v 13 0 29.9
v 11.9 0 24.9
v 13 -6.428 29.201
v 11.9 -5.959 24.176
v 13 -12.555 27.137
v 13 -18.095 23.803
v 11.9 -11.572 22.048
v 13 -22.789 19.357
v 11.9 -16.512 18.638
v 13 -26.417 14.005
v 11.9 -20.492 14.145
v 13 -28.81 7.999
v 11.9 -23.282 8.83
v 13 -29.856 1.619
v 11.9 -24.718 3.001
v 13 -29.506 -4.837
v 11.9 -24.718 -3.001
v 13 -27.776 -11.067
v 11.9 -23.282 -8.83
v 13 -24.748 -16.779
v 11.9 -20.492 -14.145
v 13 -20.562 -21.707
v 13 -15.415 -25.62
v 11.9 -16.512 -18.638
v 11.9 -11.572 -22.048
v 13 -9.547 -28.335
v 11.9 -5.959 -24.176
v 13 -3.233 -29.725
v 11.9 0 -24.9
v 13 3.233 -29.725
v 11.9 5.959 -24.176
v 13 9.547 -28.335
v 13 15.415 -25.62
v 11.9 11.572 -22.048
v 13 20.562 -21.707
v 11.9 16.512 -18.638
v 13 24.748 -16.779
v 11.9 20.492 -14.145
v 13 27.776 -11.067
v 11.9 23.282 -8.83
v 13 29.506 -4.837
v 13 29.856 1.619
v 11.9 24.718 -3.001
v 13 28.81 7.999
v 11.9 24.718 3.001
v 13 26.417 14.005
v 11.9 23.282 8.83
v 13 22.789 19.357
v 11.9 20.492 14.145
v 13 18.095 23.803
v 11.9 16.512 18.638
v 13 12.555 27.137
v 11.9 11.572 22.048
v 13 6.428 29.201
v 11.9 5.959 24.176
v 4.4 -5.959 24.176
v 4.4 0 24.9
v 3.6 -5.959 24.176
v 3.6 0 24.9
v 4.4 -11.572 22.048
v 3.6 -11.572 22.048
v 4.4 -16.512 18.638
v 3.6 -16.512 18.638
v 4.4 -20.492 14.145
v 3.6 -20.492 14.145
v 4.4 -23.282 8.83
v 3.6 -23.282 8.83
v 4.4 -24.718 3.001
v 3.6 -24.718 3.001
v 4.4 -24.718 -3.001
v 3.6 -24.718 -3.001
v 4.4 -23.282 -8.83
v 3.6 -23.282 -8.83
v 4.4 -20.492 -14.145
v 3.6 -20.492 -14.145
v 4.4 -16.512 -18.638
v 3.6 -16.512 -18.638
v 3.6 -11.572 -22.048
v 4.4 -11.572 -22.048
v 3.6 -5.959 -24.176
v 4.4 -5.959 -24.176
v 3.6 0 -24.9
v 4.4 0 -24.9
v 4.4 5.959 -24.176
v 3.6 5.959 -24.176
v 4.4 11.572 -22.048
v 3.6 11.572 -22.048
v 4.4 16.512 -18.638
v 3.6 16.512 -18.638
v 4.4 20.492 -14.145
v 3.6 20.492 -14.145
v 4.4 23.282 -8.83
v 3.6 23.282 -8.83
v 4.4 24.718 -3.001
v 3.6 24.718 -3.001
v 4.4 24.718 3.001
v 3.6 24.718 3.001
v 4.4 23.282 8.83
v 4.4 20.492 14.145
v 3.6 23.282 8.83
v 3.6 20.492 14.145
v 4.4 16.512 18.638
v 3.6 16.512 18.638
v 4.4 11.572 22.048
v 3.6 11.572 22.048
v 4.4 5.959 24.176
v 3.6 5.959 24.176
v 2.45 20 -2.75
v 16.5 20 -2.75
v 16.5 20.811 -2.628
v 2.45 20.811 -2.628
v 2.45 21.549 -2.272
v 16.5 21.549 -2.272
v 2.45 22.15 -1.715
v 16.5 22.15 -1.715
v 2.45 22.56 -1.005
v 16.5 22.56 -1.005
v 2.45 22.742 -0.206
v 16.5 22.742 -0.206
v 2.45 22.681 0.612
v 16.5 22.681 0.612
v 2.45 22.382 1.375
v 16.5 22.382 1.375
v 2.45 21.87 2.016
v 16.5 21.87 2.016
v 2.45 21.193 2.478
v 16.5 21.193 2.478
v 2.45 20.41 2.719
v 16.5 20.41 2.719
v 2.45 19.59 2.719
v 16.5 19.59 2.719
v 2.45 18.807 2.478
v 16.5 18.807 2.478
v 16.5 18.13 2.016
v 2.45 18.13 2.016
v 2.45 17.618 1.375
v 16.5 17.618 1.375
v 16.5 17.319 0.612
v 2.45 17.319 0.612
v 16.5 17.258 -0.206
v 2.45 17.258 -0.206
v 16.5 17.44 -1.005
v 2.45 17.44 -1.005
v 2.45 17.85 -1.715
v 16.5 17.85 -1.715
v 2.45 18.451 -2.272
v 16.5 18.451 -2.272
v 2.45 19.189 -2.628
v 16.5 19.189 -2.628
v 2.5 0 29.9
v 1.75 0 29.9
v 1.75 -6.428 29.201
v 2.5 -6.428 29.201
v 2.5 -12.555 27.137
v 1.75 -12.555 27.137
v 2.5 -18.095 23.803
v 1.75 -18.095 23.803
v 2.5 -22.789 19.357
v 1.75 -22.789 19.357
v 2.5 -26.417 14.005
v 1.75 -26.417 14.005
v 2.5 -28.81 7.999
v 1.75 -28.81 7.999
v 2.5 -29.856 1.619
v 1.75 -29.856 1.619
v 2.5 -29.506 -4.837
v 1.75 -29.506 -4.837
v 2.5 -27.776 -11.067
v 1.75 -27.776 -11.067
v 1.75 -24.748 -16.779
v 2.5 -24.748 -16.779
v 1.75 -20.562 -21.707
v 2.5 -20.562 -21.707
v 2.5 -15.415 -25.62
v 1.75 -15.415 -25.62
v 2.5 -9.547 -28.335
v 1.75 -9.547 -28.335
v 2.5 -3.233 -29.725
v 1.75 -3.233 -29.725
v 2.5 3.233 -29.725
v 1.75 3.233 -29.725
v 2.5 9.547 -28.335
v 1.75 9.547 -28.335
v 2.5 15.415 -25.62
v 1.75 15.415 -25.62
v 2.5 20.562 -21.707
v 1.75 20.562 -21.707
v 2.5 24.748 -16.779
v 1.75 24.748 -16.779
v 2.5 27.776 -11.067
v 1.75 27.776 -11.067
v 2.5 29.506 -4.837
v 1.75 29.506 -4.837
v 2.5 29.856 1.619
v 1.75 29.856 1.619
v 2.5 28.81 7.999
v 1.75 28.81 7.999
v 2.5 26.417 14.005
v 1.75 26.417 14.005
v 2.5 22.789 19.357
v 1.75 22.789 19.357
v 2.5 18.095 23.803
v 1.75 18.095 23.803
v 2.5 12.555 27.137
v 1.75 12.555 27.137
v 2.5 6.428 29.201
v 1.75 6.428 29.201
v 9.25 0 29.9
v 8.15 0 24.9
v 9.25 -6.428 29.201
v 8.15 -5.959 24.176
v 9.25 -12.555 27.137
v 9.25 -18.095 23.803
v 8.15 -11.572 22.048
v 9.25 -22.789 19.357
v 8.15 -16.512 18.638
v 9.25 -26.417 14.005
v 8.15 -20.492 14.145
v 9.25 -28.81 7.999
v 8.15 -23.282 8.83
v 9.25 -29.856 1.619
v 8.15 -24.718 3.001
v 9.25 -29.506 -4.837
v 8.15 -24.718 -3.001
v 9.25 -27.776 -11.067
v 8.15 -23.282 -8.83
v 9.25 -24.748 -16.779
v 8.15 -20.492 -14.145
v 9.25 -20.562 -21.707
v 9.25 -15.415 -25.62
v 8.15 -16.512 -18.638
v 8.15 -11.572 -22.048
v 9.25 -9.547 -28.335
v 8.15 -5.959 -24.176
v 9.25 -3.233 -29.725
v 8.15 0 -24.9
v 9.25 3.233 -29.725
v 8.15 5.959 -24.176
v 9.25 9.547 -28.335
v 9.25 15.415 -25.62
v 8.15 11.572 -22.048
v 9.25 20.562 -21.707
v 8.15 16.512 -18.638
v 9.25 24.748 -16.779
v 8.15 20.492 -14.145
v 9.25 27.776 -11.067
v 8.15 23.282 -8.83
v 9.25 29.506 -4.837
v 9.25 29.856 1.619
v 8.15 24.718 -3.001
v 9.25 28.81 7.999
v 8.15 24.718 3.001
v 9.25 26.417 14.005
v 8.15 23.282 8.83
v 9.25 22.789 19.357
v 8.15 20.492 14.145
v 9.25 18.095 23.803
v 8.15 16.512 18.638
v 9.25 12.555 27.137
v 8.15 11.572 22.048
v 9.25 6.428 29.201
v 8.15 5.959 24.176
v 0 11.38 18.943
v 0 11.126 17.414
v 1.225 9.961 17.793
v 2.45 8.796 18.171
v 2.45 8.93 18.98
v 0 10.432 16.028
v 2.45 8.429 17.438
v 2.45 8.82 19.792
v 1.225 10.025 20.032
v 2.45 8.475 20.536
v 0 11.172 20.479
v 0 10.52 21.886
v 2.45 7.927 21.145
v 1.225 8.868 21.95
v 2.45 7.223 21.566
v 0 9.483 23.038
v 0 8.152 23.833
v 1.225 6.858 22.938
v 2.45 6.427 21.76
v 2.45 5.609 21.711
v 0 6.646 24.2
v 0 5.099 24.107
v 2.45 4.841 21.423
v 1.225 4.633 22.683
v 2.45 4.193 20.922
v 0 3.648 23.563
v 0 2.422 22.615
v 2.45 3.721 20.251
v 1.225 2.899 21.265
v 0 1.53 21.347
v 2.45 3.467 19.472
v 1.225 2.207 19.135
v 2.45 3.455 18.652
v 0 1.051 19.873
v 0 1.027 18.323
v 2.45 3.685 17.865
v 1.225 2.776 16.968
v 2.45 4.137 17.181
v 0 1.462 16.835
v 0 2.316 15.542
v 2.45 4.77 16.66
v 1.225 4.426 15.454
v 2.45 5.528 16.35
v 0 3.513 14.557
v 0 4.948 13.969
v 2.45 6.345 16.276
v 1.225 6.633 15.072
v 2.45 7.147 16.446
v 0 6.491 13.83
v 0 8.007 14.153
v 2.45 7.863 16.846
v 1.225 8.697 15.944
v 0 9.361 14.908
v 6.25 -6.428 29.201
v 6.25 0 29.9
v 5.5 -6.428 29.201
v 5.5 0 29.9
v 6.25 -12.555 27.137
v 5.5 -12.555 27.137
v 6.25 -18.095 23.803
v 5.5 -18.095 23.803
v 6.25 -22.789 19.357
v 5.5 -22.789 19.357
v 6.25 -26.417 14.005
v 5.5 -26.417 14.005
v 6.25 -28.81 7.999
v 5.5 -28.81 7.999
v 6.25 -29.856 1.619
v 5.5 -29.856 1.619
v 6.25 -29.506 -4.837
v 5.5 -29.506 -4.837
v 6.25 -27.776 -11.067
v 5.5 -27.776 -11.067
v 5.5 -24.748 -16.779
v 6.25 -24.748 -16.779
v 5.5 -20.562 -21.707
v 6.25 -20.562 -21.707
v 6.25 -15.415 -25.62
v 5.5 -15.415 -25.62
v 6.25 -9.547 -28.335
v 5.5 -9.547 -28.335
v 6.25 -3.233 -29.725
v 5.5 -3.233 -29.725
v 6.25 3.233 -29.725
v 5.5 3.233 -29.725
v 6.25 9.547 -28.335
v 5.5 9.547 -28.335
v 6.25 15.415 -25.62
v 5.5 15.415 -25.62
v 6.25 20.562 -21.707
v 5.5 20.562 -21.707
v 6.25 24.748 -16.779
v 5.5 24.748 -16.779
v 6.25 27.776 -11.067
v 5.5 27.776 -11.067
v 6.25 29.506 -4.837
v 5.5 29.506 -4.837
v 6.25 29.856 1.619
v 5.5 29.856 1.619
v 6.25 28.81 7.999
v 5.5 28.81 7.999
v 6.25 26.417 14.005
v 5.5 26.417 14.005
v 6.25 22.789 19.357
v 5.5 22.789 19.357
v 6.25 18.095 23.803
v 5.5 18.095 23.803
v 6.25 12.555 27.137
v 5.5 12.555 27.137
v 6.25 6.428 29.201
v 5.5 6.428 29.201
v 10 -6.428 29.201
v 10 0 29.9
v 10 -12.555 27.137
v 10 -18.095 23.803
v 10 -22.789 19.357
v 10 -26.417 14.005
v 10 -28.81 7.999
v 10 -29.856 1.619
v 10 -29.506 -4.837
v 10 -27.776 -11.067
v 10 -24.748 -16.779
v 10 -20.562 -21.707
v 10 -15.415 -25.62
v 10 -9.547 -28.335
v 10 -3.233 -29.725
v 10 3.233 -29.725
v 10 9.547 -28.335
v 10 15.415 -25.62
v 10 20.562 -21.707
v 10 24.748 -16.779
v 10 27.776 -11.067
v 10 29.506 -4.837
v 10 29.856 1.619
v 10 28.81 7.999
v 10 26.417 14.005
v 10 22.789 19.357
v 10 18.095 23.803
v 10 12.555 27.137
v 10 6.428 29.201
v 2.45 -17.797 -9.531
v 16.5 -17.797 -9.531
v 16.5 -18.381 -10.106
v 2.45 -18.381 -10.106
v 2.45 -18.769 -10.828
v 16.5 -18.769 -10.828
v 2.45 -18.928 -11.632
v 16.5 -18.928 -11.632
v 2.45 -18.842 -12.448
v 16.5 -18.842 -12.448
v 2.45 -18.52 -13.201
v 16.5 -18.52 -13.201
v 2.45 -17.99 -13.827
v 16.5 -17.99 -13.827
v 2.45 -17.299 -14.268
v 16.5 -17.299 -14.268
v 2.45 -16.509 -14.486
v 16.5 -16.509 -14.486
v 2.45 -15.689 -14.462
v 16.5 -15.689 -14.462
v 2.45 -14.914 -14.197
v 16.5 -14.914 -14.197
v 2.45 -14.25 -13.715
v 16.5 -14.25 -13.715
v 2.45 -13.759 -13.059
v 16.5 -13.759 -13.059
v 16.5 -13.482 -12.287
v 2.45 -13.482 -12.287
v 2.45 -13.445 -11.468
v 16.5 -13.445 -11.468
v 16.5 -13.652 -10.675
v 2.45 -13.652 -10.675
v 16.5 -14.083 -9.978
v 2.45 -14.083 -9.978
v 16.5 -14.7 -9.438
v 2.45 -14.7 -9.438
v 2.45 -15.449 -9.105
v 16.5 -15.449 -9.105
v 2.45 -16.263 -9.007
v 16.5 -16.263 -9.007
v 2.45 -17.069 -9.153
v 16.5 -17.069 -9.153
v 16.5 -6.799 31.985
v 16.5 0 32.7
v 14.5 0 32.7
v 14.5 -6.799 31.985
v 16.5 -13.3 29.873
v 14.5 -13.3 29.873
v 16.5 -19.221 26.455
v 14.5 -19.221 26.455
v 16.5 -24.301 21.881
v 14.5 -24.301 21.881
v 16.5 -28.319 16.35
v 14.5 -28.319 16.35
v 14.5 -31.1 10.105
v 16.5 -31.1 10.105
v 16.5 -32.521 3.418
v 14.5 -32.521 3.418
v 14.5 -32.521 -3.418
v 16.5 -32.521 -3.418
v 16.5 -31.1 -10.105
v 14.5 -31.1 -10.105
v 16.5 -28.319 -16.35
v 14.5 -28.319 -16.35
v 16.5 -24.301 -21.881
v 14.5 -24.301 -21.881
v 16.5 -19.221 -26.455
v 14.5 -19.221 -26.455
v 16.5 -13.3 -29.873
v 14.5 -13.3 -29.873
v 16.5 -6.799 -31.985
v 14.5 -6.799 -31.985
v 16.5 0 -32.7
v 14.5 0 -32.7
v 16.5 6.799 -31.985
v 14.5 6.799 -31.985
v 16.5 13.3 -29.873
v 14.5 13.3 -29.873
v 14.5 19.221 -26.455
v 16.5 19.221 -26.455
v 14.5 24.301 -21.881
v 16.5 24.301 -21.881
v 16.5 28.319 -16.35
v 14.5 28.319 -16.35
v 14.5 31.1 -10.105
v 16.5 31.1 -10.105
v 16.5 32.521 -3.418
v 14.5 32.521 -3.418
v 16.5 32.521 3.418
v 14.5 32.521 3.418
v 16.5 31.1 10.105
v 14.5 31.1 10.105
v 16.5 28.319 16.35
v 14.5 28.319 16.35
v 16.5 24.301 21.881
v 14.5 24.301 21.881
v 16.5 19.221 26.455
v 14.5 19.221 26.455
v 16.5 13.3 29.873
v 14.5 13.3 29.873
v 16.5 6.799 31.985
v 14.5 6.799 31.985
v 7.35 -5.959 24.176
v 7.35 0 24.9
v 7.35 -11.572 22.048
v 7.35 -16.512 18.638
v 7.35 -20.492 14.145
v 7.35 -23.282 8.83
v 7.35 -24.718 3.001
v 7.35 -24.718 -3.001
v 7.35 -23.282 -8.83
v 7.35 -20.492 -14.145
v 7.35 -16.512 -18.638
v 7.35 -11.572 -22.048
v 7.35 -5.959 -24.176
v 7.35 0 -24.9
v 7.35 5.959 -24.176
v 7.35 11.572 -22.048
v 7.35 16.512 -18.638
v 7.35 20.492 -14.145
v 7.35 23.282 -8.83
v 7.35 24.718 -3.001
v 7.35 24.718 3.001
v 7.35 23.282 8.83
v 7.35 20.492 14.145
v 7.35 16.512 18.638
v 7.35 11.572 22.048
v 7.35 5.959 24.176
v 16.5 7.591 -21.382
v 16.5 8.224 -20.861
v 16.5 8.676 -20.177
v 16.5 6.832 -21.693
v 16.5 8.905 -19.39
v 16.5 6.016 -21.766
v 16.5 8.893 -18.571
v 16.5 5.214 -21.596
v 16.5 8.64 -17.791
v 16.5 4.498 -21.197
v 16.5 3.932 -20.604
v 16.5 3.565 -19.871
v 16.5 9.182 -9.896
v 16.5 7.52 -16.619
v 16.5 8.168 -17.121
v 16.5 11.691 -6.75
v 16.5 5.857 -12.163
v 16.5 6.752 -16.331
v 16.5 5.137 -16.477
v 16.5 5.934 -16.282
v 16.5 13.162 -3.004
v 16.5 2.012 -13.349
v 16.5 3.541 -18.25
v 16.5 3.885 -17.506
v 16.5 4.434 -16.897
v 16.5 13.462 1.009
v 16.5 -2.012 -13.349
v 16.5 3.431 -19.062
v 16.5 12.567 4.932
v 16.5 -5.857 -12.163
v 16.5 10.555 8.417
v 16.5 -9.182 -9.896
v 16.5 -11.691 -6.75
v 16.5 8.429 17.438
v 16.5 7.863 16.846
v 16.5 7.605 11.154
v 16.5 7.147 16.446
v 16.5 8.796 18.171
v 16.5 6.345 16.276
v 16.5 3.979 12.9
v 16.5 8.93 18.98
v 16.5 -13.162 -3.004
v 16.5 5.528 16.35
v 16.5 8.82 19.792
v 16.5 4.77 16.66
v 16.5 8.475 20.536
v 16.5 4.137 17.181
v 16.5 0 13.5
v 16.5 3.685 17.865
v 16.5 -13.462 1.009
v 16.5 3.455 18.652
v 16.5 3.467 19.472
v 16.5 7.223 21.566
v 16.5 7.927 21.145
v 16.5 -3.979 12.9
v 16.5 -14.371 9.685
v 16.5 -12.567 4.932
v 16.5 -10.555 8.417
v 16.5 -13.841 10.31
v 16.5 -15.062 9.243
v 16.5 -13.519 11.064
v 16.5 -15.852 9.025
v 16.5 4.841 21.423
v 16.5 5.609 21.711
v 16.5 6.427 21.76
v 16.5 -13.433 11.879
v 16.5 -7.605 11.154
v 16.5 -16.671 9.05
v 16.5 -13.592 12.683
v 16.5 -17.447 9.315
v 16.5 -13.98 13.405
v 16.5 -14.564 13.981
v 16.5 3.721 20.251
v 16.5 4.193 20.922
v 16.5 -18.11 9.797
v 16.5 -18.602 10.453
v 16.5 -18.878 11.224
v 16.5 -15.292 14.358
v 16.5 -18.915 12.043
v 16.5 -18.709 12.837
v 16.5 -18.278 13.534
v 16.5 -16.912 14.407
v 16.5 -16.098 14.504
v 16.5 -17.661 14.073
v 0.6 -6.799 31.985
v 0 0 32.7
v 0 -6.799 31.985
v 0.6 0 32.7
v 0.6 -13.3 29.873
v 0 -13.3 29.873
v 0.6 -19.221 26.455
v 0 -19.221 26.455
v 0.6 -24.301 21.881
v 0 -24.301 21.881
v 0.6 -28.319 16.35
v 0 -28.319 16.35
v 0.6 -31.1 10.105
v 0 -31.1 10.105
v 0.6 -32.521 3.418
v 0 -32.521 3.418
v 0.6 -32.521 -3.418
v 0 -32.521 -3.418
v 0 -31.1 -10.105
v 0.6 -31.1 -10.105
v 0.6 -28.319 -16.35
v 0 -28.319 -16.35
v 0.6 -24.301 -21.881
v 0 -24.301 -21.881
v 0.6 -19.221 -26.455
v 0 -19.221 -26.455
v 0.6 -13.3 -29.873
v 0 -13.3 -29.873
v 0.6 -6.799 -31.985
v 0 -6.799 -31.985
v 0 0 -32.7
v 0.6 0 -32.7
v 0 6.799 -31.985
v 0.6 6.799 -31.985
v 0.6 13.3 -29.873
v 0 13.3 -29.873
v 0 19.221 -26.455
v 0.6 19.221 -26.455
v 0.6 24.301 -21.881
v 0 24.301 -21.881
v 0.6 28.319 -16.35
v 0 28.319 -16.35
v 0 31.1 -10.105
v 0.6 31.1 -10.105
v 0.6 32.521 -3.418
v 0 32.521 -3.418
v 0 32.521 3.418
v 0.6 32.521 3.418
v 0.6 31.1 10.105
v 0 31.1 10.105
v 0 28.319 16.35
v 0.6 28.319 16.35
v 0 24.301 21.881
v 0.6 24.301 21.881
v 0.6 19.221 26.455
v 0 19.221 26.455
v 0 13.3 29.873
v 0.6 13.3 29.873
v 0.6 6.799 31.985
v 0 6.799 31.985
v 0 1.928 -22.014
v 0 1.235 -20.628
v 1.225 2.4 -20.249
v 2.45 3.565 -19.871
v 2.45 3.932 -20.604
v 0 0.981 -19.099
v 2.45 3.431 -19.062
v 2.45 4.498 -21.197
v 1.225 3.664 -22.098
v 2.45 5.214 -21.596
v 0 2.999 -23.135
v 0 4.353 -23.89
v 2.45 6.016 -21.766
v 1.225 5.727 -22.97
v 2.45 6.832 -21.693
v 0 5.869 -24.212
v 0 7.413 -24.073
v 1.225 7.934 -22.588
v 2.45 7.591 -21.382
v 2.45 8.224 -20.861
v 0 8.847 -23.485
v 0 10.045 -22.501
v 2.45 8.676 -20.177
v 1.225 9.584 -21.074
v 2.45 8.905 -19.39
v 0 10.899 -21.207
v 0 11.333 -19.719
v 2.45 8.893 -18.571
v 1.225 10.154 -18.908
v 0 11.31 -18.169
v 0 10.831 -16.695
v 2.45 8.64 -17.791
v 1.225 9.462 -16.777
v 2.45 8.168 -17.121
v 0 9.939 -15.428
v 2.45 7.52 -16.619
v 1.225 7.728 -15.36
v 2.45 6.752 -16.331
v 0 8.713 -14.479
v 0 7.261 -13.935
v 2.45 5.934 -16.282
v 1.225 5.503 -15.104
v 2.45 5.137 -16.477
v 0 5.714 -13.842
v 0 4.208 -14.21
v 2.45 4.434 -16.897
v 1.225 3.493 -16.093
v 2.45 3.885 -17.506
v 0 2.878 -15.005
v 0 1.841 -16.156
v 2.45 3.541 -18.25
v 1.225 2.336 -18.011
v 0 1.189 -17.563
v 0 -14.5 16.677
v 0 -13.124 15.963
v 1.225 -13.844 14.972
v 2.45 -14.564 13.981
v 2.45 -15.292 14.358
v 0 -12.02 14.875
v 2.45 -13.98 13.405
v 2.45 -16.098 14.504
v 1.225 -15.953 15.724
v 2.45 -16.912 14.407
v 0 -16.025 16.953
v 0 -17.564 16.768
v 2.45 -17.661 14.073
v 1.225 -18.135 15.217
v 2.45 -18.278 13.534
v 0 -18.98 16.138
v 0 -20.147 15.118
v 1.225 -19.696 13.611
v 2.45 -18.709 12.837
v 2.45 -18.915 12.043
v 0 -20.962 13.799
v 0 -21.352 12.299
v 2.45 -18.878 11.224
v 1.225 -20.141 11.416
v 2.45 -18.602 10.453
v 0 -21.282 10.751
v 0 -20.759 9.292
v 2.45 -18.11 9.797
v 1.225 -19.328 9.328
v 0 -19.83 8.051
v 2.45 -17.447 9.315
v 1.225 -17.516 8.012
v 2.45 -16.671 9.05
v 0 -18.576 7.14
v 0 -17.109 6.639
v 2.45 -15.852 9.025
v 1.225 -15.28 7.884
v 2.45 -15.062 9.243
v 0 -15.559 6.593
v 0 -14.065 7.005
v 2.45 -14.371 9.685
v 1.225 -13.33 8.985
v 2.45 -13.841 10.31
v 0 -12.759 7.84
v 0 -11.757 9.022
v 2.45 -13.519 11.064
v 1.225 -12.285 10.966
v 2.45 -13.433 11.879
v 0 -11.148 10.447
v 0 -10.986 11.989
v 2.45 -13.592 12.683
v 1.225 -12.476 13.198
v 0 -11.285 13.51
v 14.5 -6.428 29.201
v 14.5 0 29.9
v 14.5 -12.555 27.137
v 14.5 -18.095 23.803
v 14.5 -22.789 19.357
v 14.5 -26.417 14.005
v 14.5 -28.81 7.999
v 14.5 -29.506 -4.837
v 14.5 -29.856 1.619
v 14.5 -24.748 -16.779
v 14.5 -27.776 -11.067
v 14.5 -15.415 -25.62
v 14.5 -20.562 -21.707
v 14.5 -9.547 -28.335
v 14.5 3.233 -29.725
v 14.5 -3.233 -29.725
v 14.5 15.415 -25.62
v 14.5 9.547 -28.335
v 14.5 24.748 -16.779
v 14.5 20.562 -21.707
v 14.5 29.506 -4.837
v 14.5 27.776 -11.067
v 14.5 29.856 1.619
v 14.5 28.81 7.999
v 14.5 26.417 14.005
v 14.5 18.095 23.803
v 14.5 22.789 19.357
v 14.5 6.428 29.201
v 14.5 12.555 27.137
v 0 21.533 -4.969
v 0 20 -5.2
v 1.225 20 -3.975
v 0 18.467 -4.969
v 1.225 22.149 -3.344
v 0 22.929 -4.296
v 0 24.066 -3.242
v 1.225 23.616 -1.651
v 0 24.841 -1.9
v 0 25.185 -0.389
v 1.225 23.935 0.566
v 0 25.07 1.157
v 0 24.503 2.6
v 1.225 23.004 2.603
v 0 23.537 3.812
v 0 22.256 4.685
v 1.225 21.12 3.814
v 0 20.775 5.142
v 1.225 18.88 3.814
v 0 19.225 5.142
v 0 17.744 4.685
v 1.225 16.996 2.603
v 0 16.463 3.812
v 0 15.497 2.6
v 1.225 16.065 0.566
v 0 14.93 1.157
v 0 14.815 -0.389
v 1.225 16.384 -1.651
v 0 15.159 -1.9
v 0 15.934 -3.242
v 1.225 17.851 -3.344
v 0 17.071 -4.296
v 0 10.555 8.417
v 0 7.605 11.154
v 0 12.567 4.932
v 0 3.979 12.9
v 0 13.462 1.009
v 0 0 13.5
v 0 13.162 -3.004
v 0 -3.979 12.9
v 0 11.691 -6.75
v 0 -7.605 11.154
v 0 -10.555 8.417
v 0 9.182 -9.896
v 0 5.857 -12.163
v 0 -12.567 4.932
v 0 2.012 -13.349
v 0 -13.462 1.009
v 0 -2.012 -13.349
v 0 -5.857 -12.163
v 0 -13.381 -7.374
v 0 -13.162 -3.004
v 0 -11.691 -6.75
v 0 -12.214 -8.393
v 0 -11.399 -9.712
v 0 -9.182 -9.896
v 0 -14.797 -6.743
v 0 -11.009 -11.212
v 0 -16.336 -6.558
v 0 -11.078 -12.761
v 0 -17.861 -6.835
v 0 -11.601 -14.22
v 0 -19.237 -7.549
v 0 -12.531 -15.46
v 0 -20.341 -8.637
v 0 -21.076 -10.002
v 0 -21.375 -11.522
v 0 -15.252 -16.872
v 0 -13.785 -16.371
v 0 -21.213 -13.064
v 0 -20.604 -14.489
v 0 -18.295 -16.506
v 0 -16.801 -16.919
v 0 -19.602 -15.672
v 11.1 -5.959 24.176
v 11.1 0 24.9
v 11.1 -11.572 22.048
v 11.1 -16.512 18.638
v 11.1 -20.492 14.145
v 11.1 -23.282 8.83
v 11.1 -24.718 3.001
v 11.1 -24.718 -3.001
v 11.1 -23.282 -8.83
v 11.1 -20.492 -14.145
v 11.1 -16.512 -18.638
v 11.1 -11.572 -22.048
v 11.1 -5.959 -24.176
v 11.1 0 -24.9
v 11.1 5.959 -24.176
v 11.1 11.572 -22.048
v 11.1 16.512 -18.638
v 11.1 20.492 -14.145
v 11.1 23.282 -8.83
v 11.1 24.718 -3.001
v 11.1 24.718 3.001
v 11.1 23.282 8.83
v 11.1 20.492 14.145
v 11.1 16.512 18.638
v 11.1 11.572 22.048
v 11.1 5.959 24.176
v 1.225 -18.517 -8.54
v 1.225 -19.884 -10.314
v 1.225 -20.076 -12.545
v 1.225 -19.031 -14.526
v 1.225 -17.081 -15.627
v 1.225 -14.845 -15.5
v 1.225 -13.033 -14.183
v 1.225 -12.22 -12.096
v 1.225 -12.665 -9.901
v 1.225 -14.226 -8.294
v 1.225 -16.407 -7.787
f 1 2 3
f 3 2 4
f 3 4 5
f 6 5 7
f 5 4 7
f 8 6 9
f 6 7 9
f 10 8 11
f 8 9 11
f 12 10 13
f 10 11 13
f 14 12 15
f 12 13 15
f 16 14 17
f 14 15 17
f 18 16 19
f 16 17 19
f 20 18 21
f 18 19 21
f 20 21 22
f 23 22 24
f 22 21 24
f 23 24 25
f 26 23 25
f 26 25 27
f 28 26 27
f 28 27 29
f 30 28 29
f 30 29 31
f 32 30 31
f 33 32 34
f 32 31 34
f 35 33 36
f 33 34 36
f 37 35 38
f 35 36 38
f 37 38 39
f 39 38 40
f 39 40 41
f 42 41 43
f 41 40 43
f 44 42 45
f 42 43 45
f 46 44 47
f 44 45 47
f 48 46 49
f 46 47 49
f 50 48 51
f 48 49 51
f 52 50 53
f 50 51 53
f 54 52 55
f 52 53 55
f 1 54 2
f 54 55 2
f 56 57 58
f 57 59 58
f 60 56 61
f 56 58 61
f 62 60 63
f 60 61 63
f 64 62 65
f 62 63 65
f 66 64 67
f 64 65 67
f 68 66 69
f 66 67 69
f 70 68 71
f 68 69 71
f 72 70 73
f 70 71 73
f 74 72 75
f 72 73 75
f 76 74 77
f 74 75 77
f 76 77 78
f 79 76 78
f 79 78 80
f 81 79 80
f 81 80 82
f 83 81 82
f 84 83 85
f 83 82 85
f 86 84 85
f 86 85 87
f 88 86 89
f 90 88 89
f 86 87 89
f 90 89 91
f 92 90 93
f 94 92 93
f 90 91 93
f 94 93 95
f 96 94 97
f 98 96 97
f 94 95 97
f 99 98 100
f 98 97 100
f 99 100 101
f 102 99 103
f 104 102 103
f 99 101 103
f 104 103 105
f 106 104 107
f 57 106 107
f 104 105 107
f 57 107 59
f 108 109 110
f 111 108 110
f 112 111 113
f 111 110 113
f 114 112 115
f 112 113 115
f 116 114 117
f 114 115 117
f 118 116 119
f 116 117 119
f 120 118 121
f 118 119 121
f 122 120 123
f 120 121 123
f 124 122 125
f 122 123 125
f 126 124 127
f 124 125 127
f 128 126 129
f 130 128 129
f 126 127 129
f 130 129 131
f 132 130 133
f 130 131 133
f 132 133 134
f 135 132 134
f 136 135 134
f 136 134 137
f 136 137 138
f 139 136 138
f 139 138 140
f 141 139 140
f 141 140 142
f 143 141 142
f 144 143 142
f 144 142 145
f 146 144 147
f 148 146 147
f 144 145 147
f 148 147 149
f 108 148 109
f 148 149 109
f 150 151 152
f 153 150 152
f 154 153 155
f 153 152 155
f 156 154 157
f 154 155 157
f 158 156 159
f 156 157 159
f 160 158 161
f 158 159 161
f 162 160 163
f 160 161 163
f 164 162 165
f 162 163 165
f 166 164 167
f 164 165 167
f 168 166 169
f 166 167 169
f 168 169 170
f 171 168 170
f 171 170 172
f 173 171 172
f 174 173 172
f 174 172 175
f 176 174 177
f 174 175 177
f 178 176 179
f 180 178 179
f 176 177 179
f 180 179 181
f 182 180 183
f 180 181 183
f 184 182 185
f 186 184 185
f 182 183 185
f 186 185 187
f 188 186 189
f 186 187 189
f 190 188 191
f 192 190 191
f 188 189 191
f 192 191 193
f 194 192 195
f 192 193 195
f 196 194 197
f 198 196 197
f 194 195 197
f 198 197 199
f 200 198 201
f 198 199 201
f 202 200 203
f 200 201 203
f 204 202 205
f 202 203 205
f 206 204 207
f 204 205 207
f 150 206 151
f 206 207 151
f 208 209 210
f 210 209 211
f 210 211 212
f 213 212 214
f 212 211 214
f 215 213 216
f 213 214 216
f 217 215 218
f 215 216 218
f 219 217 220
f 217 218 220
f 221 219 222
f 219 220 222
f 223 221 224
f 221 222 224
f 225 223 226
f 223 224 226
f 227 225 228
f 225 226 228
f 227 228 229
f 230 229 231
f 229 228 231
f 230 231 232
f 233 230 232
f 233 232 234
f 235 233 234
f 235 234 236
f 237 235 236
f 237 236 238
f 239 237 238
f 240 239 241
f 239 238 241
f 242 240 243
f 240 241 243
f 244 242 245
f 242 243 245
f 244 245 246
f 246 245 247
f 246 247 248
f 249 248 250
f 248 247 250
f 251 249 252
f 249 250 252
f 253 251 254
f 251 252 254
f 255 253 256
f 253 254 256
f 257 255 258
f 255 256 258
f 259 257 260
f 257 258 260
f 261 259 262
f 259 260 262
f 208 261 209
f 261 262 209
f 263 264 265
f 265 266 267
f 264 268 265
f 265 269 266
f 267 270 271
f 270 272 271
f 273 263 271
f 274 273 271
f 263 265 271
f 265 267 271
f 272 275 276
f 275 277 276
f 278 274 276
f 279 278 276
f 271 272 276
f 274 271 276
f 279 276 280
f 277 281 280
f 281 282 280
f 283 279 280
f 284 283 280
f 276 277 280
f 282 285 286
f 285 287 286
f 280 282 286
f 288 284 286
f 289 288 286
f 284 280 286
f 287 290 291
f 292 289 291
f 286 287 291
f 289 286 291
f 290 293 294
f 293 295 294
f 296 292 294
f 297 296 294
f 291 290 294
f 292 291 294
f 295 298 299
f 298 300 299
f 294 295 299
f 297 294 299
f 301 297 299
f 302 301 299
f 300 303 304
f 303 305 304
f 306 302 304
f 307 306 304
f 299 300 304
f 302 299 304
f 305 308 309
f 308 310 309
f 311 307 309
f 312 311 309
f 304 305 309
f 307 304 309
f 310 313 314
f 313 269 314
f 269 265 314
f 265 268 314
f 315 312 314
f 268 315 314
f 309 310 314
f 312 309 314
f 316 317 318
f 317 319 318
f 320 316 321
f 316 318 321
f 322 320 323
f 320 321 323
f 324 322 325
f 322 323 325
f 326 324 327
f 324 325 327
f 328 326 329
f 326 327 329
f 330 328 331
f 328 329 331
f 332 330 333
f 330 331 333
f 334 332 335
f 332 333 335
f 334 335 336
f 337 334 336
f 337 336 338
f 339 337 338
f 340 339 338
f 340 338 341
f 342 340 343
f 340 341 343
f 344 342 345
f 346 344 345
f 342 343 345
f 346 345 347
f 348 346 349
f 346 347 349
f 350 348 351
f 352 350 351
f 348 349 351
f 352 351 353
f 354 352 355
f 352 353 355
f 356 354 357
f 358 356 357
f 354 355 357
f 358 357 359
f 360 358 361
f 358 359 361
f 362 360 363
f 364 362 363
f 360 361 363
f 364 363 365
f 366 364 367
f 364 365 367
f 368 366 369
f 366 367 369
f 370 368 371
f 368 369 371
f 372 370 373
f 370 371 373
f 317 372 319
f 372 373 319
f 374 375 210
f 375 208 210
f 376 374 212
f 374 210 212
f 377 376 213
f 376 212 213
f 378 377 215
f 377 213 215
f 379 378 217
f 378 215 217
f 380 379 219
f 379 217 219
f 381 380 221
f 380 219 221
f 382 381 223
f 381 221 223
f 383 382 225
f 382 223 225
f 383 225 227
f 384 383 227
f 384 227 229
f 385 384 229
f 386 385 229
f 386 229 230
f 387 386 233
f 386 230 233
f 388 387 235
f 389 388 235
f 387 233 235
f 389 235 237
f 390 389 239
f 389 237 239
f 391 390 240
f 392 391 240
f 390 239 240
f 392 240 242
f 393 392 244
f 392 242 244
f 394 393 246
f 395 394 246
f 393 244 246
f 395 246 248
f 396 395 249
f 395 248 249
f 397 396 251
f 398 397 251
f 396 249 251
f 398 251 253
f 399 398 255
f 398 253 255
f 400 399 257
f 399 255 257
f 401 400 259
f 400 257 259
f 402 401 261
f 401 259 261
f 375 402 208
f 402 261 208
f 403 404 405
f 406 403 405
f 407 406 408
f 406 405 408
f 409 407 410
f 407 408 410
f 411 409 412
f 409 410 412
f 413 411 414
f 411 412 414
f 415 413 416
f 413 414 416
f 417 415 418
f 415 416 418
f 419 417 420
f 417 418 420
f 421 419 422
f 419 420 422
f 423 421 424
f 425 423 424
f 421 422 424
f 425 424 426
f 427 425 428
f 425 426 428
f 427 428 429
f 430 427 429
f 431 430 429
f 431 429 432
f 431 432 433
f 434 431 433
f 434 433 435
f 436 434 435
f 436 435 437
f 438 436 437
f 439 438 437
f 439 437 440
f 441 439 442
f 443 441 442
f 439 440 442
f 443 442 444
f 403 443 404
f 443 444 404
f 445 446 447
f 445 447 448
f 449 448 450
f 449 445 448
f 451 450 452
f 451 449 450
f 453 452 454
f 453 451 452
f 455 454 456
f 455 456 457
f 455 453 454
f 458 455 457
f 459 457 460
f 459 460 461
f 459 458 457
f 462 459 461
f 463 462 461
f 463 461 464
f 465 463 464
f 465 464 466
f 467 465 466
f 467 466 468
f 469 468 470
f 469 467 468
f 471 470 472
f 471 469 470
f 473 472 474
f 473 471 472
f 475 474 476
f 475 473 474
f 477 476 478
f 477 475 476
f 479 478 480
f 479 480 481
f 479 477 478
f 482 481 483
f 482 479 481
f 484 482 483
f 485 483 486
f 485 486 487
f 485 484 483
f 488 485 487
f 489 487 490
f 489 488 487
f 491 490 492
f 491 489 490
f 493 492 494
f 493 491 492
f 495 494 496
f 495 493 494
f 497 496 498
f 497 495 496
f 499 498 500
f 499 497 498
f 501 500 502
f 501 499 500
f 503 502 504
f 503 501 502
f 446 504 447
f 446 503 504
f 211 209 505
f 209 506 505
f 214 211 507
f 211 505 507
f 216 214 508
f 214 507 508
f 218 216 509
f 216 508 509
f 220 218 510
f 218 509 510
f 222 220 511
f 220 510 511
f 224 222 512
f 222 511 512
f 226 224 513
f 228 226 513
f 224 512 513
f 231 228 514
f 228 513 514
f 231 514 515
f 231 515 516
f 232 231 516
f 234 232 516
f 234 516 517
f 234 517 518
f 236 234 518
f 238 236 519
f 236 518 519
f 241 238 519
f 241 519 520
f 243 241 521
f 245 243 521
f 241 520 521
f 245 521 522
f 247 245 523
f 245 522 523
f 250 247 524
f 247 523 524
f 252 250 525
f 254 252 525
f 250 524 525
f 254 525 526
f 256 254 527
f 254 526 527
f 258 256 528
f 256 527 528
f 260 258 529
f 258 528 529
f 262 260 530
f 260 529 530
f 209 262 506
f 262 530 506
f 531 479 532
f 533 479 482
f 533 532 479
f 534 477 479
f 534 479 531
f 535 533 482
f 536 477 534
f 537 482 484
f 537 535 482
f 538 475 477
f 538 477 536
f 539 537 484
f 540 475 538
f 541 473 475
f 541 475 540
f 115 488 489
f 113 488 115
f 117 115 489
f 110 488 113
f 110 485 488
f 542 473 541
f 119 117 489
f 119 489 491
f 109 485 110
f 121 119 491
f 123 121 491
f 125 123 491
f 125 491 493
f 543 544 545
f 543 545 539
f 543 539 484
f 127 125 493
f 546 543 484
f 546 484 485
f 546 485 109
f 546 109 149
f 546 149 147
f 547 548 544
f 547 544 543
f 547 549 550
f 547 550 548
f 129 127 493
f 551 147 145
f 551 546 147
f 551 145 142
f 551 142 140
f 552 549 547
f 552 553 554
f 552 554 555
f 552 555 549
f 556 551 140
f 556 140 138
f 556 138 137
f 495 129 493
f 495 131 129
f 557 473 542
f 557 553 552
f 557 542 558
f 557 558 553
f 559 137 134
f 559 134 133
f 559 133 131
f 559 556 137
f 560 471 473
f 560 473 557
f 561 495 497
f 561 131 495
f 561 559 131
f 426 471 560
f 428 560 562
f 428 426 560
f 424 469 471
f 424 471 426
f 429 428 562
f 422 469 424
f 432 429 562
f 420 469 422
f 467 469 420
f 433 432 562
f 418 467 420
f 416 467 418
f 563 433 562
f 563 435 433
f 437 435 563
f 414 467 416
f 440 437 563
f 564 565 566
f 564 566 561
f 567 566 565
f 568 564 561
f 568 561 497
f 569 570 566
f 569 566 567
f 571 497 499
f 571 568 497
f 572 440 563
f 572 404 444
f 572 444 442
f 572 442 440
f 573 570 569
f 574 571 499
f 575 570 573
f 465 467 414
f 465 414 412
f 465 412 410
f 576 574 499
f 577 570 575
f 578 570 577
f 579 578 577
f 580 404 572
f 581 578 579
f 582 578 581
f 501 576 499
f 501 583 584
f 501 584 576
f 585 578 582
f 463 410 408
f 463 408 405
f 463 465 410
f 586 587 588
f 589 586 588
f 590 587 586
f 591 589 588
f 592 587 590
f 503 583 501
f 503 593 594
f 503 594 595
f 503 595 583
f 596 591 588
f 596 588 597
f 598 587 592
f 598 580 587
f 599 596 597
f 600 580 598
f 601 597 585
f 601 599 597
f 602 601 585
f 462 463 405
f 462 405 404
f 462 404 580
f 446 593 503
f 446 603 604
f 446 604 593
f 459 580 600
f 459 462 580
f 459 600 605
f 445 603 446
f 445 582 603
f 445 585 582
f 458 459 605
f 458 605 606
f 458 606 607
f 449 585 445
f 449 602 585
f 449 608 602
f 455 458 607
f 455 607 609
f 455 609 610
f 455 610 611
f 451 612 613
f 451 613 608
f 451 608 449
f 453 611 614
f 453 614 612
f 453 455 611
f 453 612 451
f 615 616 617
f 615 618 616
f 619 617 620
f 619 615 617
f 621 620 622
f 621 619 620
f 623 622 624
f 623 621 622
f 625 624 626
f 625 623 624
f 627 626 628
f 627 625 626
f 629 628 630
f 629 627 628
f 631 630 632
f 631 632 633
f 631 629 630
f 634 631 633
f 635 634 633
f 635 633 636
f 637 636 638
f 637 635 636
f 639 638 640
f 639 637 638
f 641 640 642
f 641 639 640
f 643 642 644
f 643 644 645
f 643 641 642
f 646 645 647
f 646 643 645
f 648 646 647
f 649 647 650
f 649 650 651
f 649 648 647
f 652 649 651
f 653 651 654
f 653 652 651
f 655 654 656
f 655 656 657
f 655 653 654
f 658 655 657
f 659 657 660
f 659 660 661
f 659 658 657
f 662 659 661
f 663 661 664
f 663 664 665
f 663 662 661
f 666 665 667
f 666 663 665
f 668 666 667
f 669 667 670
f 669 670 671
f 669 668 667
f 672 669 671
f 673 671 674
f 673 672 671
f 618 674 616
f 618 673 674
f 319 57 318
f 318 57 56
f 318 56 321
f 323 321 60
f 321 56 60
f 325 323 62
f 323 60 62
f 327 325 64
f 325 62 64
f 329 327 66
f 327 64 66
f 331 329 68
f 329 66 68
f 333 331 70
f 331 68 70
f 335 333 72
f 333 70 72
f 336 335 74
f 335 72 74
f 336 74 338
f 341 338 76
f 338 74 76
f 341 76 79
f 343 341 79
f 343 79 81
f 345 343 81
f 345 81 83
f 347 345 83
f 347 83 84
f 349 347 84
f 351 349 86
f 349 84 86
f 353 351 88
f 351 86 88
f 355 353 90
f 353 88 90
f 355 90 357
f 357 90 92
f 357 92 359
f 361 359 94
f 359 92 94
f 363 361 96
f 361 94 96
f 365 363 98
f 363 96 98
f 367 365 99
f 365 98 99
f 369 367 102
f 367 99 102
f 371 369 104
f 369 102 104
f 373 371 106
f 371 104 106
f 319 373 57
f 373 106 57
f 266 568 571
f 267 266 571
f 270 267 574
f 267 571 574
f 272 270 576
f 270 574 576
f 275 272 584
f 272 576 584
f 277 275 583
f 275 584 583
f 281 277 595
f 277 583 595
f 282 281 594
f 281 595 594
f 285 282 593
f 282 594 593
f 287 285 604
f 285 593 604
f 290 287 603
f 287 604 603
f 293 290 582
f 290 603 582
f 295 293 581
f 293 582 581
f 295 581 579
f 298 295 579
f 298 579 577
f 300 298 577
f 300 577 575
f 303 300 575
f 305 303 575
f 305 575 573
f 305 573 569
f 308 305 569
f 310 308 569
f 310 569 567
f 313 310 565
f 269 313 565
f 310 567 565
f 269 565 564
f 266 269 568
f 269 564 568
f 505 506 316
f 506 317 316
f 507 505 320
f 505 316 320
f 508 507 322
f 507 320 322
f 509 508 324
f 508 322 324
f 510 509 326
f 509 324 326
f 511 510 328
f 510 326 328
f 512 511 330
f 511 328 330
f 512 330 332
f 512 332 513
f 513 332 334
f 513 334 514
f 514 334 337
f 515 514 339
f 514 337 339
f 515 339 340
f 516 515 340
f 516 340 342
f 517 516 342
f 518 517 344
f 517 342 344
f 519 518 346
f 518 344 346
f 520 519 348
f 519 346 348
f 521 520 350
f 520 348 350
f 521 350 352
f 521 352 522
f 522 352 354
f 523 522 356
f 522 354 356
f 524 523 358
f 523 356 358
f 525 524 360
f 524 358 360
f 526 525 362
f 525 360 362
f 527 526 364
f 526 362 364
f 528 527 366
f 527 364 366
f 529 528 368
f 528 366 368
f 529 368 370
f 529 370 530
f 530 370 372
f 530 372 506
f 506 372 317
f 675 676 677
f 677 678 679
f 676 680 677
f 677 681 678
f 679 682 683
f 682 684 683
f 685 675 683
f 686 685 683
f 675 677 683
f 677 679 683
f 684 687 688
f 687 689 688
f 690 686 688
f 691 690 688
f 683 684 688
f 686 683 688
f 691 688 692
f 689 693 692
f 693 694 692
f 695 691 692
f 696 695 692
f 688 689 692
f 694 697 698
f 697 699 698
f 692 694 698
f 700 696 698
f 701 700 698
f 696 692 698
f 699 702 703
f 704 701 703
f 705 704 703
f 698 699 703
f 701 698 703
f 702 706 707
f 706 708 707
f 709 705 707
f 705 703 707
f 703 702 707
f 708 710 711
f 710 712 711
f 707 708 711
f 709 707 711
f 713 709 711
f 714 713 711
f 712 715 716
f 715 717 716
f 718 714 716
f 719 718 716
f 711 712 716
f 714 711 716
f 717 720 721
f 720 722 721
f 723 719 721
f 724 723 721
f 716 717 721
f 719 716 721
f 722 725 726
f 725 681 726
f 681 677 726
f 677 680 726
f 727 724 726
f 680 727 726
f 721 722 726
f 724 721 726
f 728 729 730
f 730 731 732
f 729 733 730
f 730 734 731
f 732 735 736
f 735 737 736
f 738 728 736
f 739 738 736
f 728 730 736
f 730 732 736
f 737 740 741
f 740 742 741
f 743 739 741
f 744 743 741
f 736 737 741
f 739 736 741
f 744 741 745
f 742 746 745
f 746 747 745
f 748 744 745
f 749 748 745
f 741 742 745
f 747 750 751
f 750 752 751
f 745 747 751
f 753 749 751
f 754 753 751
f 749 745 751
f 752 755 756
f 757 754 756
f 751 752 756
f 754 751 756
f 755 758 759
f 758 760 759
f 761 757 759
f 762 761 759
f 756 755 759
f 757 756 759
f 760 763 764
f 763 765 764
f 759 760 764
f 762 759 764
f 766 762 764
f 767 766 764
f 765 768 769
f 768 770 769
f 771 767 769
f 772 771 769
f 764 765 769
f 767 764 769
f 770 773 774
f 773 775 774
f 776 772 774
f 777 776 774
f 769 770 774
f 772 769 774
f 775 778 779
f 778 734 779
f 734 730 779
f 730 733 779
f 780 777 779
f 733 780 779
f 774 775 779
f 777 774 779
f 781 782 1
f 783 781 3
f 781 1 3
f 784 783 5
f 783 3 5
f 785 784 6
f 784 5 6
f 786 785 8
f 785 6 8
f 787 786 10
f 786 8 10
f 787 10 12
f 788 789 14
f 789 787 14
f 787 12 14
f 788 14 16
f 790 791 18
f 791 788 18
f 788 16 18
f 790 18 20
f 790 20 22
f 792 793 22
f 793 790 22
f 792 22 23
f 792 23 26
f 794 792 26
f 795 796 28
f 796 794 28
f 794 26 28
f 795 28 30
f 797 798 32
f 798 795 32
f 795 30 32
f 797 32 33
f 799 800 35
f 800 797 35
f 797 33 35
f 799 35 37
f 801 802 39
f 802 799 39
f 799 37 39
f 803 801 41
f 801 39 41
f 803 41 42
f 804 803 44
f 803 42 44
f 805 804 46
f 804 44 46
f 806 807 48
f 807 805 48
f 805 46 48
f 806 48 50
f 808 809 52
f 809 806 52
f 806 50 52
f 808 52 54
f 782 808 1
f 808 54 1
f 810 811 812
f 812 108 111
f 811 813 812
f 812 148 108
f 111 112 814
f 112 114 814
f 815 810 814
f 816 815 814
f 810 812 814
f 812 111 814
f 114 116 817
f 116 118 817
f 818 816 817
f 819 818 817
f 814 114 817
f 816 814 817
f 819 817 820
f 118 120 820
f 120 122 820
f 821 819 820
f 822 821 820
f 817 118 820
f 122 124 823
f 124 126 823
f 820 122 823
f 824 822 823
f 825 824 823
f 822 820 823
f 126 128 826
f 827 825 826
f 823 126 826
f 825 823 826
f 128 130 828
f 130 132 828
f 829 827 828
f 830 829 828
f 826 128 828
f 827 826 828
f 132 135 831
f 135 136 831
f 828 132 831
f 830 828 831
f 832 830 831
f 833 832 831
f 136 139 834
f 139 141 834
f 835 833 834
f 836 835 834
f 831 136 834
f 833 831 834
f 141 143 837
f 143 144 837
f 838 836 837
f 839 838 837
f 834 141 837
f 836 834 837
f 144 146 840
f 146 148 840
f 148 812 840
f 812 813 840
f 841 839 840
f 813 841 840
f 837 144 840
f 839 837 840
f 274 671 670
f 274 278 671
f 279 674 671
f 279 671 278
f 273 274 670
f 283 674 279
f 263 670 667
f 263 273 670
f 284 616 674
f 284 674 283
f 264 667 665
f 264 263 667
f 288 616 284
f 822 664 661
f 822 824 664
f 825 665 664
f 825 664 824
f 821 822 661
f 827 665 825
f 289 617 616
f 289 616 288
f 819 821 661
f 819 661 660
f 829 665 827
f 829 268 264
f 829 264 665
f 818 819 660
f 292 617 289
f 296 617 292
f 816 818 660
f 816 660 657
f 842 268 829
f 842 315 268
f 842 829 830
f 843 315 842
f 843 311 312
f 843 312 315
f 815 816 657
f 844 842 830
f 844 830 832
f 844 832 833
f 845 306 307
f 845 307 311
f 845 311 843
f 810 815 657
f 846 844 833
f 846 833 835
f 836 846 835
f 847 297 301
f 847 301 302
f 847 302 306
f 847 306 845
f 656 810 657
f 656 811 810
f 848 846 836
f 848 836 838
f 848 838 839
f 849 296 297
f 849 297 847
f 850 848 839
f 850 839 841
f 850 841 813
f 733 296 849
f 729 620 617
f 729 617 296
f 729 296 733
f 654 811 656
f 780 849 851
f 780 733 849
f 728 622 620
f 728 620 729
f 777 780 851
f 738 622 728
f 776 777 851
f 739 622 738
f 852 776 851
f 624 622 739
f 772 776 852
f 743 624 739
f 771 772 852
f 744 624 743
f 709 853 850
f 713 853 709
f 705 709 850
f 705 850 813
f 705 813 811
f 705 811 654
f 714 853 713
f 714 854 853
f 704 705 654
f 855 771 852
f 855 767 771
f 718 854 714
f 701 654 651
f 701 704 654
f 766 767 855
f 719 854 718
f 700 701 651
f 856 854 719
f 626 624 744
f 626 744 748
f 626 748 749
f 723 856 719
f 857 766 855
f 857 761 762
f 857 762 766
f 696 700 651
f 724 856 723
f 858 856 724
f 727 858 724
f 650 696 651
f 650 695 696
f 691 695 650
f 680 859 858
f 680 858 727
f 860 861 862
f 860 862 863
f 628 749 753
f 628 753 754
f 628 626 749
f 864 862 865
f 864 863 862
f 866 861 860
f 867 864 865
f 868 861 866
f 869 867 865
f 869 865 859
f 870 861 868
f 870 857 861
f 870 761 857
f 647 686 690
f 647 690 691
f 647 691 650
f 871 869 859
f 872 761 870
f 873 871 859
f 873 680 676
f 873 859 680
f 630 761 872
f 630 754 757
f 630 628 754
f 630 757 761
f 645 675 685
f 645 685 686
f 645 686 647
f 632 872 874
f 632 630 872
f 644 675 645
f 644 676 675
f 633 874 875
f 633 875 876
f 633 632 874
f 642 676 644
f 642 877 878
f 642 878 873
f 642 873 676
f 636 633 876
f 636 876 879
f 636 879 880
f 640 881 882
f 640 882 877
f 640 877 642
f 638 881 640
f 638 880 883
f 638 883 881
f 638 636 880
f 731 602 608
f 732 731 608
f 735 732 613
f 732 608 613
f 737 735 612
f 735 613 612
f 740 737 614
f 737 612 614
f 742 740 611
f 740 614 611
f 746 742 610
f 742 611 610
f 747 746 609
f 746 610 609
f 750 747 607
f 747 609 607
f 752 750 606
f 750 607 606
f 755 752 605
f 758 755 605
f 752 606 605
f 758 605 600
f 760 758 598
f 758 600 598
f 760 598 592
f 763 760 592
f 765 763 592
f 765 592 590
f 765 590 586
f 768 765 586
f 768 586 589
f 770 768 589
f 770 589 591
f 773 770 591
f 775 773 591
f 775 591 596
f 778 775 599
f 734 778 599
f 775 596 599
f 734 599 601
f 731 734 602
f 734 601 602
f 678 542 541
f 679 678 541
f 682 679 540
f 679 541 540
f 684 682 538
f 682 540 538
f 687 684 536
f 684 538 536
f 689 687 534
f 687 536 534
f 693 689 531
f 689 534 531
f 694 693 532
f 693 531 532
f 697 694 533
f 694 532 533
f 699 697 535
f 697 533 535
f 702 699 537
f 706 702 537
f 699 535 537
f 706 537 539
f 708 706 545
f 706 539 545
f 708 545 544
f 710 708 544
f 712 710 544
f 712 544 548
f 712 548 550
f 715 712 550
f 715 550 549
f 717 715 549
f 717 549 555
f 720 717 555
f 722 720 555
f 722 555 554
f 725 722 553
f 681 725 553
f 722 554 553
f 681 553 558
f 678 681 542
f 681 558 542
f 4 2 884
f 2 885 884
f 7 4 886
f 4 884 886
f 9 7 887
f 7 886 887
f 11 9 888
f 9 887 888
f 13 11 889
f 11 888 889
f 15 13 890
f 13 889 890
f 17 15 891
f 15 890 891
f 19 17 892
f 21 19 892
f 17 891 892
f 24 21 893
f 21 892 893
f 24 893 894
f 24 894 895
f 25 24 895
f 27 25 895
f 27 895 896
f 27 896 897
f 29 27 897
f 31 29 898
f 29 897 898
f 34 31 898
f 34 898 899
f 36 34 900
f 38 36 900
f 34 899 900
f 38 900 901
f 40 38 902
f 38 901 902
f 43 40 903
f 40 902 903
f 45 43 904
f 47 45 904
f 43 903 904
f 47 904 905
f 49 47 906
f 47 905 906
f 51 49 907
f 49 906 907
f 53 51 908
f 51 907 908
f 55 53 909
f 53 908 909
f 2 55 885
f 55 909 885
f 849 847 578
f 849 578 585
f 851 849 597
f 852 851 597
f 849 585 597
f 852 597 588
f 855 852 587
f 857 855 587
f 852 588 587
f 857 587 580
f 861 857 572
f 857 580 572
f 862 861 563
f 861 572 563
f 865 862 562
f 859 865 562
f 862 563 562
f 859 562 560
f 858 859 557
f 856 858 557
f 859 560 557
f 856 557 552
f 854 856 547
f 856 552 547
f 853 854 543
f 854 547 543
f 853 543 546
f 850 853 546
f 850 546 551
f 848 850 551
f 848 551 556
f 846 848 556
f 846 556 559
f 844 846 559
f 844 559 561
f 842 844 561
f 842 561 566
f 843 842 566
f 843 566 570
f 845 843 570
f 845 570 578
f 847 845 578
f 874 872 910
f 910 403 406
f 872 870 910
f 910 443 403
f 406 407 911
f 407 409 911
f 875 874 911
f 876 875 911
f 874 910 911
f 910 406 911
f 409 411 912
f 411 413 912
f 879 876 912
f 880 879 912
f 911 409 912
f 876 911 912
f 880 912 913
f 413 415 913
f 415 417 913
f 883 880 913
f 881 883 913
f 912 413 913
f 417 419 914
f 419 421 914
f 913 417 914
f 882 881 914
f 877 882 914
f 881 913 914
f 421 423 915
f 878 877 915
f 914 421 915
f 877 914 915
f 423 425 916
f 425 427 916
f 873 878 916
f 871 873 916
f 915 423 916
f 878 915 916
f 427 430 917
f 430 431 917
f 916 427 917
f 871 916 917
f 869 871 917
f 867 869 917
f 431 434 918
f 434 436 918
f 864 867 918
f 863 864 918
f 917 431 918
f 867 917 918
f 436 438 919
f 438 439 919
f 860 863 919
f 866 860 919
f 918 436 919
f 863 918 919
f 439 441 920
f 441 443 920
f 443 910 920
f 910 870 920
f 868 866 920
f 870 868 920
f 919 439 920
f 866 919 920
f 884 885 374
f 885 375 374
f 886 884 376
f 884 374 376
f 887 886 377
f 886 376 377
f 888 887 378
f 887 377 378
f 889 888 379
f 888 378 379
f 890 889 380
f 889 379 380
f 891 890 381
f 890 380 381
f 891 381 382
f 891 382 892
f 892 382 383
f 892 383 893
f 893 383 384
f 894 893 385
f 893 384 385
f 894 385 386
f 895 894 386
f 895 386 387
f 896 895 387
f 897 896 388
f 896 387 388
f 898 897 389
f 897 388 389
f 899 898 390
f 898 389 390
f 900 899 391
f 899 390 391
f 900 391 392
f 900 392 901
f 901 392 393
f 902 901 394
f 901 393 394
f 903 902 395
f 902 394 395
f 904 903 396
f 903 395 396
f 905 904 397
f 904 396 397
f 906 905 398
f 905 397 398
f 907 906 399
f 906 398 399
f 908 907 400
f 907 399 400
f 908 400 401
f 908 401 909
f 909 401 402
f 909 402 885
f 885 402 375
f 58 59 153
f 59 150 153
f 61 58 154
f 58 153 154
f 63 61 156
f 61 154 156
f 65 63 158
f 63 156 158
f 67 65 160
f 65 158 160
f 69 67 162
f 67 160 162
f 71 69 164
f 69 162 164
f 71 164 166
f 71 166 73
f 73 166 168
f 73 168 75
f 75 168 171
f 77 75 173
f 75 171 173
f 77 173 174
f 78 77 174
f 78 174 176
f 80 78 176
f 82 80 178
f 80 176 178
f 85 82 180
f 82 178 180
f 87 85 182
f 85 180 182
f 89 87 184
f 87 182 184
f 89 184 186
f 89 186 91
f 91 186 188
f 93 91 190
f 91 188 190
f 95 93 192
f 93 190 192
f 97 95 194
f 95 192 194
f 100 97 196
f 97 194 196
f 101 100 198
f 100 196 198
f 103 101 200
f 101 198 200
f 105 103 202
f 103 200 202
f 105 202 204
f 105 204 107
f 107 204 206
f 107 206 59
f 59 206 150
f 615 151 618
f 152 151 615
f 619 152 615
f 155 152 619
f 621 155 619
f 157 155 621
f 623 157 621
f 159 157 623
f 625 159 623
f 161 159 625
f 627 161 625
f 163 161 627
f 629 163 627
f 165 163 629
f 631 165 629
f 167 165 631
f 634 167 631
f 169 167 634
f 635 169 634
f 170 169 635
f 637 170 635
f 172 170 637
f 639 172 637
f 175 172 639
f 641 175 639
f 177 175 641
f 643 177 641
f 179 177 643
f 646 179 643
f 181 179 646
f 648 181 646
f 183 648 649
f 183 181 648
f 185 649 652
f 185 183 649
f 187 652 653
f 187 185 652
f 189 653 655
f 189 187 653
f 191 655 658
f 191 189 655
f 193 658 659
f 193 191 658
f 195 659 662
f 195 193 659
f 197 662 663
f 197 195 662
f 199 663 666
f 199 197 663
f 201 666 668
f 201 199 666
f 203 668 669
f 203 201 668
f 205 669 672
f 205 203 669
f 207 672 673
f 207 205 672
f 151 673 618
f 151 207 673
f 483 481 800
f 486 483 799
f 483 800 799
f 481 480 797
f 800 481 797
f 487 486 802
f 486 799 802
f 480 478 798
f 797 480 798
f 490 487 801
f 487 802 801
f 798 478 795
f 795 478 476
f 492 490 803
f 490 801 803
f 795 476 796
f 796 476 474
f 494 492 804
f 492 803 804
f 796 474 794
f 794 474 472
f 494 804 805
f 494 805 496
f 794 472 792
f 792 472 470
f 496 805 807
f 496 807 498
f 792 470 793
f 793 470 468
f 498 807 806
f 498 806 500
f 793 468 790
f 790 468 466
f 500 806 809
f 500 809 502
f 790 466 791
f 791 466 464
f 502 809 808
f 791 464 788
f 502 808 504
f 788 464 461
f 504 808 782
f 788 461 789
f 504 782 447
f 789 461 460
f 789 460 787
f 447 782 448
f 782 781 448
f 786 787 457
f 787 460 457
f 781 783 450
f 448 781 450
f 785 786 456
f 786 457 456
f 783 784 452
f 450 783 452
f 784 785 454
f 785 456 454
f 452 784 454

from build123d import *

# Parameters (mm, degrees)
ESCAREADO_PARA_PARAFUSO_COM_CABE_A_ESCAR_D           = 5.5
ESCAREADO_PARA_PARAFUSO_COM_CABE_A_ESCAR_CSINK_D     = 10.4
ESCAREADO_PARA_PARAFUSO_COM_CABE_A_ESCAR_CSINK_ANGLE = 90
PADR_OCIRCULAR1_COUNT                                = 5
ESBO_O5_R                                            = 32.7
ESBO_O5_R_2                                          = 13.5
ESBO_O5_R_3                                          = 2.75
RESSALTO_EXTRUS_O1_DEPTH                             = 2


with BuildPart() as part:
    # Esboço1 → Revolução1 (revolve)
    with BuildSketch(Plane.XY, mode=Mode.PRIVATE) as revolu_o1_sk:
        Polygon((0, 13.5), (16.5, 13.5), (16.5, 29.9), (13, 29.9), (11.9, 24.9), (11.1, 24.9), (10, 29.9), (9.25, 29.9), (8.15, 24.9), (7.35, 24.9), (6.25, 29.9), (5.5, 29.9), (4.4, 24.9), (3.6, 24.9), (2.5, 29.9), (0, 29.9), align=None)
    revolve(revolu_o1_sk.sketch.rotate(Axis((0, 0, 0), (1, 0, 0)), 90), axis=Axis((0, 0, 0), (1, 0, 0)))

    # Escareado para parafuso com cabeça escareada elevada de M51 (through all)
    with Locations(Plane.ZY):
        with Locations((0, 20)):
            escareado_para_parafuso_com_cabe_a_escar = CounterSinkHole(ESCAREADO_PARA_PARAFUSO_COM_CABE_A_ESCAR_D / 2, ESCAREADO_PARA_PARAFUSO_COM_CABE_A_ESCAR_CSINK_D / 2, counter_sink_angle=ESCAREADO_PARA_PARAFUSO_COM_CABE_A_ESCAR_CSINK_ANGLE)

    # PadrãoCircular1: Escareado para parafuso com cabeça escareada elevada de M51 ×5 about axis
    padr_ocircular1_axis = Axis((0, 0, 0), (1, 0, 0))
    for i in range(1, PADR_OCIRCULAR1_COUNT):
        add(escareado_para_parafuso_com_cabe_a_escar.rotate(padr_ocircular1_axis, i * 360 / PADR_OCIRCULAR1_COUNT), mode=Mode.SUBTRACT)

    # Esboço4 → Revolução2 (revolve)
    with BuildSketch(Plane.XY, mode=Mode.PRIVATE) as revolu_o2_sk:
        Polygon((0, 29.9), (0, 32.7), (0.6, 32.7), (1.75, 29.9), align=None)
    revolve(revolu_o2_sk.sketch.rotate(Axis((0, 0, 0), (1, 0, 0)), 90), axis=Axis((0, 0, 0), (1, 0, 0)))

    # Esboço5 → Ressalto-extrusão1 (add)
    with BuildSketch(Plane(origin=(16.5, 0, 0), x_dir=(0, 0, -1), z_dir=(1, 0, 0))):
        with Locations(Location((0, 0, 0), (0, 0, 180))):
            Circle(ESBO_O5_R)
        with Locations(Location((0, 0, 0), (0, 0, 180))):
            Circle(ESBO_O5_R_2, mode=Mode.SUBTRACT)
        with Locations(Location((-11.755705046, -16.180339887, 0), (0, 0, 180))):
            Circle(ESBO_O5_R_3, mode=Mode.SUBTRACT)
        with Locations(Location((11.755705046, -16.180339887, 0), (0, 0, 180))):
            Circle(ESBO_O5_R_3, mode=Mode.SUBTRACT)
        with Locations(Location((19.021130326, 6.180339887, 0), (0, 0, 180))):
            Circle(ESBO_O5_R_3, mode=Mode.SUBTRACT)
        with Locations(Location((0, 20, 0), (0, 0, 180))):
            Circle(ESBO_O5_R_3, mode=Mode.SUBTRACT)
        with Locations(Location((-19.021130326, 6.180339887, 0), (0, 0, 180))):
            Circle(ESBO_O5_R_3, mode=Mode.SUBTRACT)
    extrude(amount=-RESSALTO_EXTRUS_O1_DEPTH)


solid = part.part
